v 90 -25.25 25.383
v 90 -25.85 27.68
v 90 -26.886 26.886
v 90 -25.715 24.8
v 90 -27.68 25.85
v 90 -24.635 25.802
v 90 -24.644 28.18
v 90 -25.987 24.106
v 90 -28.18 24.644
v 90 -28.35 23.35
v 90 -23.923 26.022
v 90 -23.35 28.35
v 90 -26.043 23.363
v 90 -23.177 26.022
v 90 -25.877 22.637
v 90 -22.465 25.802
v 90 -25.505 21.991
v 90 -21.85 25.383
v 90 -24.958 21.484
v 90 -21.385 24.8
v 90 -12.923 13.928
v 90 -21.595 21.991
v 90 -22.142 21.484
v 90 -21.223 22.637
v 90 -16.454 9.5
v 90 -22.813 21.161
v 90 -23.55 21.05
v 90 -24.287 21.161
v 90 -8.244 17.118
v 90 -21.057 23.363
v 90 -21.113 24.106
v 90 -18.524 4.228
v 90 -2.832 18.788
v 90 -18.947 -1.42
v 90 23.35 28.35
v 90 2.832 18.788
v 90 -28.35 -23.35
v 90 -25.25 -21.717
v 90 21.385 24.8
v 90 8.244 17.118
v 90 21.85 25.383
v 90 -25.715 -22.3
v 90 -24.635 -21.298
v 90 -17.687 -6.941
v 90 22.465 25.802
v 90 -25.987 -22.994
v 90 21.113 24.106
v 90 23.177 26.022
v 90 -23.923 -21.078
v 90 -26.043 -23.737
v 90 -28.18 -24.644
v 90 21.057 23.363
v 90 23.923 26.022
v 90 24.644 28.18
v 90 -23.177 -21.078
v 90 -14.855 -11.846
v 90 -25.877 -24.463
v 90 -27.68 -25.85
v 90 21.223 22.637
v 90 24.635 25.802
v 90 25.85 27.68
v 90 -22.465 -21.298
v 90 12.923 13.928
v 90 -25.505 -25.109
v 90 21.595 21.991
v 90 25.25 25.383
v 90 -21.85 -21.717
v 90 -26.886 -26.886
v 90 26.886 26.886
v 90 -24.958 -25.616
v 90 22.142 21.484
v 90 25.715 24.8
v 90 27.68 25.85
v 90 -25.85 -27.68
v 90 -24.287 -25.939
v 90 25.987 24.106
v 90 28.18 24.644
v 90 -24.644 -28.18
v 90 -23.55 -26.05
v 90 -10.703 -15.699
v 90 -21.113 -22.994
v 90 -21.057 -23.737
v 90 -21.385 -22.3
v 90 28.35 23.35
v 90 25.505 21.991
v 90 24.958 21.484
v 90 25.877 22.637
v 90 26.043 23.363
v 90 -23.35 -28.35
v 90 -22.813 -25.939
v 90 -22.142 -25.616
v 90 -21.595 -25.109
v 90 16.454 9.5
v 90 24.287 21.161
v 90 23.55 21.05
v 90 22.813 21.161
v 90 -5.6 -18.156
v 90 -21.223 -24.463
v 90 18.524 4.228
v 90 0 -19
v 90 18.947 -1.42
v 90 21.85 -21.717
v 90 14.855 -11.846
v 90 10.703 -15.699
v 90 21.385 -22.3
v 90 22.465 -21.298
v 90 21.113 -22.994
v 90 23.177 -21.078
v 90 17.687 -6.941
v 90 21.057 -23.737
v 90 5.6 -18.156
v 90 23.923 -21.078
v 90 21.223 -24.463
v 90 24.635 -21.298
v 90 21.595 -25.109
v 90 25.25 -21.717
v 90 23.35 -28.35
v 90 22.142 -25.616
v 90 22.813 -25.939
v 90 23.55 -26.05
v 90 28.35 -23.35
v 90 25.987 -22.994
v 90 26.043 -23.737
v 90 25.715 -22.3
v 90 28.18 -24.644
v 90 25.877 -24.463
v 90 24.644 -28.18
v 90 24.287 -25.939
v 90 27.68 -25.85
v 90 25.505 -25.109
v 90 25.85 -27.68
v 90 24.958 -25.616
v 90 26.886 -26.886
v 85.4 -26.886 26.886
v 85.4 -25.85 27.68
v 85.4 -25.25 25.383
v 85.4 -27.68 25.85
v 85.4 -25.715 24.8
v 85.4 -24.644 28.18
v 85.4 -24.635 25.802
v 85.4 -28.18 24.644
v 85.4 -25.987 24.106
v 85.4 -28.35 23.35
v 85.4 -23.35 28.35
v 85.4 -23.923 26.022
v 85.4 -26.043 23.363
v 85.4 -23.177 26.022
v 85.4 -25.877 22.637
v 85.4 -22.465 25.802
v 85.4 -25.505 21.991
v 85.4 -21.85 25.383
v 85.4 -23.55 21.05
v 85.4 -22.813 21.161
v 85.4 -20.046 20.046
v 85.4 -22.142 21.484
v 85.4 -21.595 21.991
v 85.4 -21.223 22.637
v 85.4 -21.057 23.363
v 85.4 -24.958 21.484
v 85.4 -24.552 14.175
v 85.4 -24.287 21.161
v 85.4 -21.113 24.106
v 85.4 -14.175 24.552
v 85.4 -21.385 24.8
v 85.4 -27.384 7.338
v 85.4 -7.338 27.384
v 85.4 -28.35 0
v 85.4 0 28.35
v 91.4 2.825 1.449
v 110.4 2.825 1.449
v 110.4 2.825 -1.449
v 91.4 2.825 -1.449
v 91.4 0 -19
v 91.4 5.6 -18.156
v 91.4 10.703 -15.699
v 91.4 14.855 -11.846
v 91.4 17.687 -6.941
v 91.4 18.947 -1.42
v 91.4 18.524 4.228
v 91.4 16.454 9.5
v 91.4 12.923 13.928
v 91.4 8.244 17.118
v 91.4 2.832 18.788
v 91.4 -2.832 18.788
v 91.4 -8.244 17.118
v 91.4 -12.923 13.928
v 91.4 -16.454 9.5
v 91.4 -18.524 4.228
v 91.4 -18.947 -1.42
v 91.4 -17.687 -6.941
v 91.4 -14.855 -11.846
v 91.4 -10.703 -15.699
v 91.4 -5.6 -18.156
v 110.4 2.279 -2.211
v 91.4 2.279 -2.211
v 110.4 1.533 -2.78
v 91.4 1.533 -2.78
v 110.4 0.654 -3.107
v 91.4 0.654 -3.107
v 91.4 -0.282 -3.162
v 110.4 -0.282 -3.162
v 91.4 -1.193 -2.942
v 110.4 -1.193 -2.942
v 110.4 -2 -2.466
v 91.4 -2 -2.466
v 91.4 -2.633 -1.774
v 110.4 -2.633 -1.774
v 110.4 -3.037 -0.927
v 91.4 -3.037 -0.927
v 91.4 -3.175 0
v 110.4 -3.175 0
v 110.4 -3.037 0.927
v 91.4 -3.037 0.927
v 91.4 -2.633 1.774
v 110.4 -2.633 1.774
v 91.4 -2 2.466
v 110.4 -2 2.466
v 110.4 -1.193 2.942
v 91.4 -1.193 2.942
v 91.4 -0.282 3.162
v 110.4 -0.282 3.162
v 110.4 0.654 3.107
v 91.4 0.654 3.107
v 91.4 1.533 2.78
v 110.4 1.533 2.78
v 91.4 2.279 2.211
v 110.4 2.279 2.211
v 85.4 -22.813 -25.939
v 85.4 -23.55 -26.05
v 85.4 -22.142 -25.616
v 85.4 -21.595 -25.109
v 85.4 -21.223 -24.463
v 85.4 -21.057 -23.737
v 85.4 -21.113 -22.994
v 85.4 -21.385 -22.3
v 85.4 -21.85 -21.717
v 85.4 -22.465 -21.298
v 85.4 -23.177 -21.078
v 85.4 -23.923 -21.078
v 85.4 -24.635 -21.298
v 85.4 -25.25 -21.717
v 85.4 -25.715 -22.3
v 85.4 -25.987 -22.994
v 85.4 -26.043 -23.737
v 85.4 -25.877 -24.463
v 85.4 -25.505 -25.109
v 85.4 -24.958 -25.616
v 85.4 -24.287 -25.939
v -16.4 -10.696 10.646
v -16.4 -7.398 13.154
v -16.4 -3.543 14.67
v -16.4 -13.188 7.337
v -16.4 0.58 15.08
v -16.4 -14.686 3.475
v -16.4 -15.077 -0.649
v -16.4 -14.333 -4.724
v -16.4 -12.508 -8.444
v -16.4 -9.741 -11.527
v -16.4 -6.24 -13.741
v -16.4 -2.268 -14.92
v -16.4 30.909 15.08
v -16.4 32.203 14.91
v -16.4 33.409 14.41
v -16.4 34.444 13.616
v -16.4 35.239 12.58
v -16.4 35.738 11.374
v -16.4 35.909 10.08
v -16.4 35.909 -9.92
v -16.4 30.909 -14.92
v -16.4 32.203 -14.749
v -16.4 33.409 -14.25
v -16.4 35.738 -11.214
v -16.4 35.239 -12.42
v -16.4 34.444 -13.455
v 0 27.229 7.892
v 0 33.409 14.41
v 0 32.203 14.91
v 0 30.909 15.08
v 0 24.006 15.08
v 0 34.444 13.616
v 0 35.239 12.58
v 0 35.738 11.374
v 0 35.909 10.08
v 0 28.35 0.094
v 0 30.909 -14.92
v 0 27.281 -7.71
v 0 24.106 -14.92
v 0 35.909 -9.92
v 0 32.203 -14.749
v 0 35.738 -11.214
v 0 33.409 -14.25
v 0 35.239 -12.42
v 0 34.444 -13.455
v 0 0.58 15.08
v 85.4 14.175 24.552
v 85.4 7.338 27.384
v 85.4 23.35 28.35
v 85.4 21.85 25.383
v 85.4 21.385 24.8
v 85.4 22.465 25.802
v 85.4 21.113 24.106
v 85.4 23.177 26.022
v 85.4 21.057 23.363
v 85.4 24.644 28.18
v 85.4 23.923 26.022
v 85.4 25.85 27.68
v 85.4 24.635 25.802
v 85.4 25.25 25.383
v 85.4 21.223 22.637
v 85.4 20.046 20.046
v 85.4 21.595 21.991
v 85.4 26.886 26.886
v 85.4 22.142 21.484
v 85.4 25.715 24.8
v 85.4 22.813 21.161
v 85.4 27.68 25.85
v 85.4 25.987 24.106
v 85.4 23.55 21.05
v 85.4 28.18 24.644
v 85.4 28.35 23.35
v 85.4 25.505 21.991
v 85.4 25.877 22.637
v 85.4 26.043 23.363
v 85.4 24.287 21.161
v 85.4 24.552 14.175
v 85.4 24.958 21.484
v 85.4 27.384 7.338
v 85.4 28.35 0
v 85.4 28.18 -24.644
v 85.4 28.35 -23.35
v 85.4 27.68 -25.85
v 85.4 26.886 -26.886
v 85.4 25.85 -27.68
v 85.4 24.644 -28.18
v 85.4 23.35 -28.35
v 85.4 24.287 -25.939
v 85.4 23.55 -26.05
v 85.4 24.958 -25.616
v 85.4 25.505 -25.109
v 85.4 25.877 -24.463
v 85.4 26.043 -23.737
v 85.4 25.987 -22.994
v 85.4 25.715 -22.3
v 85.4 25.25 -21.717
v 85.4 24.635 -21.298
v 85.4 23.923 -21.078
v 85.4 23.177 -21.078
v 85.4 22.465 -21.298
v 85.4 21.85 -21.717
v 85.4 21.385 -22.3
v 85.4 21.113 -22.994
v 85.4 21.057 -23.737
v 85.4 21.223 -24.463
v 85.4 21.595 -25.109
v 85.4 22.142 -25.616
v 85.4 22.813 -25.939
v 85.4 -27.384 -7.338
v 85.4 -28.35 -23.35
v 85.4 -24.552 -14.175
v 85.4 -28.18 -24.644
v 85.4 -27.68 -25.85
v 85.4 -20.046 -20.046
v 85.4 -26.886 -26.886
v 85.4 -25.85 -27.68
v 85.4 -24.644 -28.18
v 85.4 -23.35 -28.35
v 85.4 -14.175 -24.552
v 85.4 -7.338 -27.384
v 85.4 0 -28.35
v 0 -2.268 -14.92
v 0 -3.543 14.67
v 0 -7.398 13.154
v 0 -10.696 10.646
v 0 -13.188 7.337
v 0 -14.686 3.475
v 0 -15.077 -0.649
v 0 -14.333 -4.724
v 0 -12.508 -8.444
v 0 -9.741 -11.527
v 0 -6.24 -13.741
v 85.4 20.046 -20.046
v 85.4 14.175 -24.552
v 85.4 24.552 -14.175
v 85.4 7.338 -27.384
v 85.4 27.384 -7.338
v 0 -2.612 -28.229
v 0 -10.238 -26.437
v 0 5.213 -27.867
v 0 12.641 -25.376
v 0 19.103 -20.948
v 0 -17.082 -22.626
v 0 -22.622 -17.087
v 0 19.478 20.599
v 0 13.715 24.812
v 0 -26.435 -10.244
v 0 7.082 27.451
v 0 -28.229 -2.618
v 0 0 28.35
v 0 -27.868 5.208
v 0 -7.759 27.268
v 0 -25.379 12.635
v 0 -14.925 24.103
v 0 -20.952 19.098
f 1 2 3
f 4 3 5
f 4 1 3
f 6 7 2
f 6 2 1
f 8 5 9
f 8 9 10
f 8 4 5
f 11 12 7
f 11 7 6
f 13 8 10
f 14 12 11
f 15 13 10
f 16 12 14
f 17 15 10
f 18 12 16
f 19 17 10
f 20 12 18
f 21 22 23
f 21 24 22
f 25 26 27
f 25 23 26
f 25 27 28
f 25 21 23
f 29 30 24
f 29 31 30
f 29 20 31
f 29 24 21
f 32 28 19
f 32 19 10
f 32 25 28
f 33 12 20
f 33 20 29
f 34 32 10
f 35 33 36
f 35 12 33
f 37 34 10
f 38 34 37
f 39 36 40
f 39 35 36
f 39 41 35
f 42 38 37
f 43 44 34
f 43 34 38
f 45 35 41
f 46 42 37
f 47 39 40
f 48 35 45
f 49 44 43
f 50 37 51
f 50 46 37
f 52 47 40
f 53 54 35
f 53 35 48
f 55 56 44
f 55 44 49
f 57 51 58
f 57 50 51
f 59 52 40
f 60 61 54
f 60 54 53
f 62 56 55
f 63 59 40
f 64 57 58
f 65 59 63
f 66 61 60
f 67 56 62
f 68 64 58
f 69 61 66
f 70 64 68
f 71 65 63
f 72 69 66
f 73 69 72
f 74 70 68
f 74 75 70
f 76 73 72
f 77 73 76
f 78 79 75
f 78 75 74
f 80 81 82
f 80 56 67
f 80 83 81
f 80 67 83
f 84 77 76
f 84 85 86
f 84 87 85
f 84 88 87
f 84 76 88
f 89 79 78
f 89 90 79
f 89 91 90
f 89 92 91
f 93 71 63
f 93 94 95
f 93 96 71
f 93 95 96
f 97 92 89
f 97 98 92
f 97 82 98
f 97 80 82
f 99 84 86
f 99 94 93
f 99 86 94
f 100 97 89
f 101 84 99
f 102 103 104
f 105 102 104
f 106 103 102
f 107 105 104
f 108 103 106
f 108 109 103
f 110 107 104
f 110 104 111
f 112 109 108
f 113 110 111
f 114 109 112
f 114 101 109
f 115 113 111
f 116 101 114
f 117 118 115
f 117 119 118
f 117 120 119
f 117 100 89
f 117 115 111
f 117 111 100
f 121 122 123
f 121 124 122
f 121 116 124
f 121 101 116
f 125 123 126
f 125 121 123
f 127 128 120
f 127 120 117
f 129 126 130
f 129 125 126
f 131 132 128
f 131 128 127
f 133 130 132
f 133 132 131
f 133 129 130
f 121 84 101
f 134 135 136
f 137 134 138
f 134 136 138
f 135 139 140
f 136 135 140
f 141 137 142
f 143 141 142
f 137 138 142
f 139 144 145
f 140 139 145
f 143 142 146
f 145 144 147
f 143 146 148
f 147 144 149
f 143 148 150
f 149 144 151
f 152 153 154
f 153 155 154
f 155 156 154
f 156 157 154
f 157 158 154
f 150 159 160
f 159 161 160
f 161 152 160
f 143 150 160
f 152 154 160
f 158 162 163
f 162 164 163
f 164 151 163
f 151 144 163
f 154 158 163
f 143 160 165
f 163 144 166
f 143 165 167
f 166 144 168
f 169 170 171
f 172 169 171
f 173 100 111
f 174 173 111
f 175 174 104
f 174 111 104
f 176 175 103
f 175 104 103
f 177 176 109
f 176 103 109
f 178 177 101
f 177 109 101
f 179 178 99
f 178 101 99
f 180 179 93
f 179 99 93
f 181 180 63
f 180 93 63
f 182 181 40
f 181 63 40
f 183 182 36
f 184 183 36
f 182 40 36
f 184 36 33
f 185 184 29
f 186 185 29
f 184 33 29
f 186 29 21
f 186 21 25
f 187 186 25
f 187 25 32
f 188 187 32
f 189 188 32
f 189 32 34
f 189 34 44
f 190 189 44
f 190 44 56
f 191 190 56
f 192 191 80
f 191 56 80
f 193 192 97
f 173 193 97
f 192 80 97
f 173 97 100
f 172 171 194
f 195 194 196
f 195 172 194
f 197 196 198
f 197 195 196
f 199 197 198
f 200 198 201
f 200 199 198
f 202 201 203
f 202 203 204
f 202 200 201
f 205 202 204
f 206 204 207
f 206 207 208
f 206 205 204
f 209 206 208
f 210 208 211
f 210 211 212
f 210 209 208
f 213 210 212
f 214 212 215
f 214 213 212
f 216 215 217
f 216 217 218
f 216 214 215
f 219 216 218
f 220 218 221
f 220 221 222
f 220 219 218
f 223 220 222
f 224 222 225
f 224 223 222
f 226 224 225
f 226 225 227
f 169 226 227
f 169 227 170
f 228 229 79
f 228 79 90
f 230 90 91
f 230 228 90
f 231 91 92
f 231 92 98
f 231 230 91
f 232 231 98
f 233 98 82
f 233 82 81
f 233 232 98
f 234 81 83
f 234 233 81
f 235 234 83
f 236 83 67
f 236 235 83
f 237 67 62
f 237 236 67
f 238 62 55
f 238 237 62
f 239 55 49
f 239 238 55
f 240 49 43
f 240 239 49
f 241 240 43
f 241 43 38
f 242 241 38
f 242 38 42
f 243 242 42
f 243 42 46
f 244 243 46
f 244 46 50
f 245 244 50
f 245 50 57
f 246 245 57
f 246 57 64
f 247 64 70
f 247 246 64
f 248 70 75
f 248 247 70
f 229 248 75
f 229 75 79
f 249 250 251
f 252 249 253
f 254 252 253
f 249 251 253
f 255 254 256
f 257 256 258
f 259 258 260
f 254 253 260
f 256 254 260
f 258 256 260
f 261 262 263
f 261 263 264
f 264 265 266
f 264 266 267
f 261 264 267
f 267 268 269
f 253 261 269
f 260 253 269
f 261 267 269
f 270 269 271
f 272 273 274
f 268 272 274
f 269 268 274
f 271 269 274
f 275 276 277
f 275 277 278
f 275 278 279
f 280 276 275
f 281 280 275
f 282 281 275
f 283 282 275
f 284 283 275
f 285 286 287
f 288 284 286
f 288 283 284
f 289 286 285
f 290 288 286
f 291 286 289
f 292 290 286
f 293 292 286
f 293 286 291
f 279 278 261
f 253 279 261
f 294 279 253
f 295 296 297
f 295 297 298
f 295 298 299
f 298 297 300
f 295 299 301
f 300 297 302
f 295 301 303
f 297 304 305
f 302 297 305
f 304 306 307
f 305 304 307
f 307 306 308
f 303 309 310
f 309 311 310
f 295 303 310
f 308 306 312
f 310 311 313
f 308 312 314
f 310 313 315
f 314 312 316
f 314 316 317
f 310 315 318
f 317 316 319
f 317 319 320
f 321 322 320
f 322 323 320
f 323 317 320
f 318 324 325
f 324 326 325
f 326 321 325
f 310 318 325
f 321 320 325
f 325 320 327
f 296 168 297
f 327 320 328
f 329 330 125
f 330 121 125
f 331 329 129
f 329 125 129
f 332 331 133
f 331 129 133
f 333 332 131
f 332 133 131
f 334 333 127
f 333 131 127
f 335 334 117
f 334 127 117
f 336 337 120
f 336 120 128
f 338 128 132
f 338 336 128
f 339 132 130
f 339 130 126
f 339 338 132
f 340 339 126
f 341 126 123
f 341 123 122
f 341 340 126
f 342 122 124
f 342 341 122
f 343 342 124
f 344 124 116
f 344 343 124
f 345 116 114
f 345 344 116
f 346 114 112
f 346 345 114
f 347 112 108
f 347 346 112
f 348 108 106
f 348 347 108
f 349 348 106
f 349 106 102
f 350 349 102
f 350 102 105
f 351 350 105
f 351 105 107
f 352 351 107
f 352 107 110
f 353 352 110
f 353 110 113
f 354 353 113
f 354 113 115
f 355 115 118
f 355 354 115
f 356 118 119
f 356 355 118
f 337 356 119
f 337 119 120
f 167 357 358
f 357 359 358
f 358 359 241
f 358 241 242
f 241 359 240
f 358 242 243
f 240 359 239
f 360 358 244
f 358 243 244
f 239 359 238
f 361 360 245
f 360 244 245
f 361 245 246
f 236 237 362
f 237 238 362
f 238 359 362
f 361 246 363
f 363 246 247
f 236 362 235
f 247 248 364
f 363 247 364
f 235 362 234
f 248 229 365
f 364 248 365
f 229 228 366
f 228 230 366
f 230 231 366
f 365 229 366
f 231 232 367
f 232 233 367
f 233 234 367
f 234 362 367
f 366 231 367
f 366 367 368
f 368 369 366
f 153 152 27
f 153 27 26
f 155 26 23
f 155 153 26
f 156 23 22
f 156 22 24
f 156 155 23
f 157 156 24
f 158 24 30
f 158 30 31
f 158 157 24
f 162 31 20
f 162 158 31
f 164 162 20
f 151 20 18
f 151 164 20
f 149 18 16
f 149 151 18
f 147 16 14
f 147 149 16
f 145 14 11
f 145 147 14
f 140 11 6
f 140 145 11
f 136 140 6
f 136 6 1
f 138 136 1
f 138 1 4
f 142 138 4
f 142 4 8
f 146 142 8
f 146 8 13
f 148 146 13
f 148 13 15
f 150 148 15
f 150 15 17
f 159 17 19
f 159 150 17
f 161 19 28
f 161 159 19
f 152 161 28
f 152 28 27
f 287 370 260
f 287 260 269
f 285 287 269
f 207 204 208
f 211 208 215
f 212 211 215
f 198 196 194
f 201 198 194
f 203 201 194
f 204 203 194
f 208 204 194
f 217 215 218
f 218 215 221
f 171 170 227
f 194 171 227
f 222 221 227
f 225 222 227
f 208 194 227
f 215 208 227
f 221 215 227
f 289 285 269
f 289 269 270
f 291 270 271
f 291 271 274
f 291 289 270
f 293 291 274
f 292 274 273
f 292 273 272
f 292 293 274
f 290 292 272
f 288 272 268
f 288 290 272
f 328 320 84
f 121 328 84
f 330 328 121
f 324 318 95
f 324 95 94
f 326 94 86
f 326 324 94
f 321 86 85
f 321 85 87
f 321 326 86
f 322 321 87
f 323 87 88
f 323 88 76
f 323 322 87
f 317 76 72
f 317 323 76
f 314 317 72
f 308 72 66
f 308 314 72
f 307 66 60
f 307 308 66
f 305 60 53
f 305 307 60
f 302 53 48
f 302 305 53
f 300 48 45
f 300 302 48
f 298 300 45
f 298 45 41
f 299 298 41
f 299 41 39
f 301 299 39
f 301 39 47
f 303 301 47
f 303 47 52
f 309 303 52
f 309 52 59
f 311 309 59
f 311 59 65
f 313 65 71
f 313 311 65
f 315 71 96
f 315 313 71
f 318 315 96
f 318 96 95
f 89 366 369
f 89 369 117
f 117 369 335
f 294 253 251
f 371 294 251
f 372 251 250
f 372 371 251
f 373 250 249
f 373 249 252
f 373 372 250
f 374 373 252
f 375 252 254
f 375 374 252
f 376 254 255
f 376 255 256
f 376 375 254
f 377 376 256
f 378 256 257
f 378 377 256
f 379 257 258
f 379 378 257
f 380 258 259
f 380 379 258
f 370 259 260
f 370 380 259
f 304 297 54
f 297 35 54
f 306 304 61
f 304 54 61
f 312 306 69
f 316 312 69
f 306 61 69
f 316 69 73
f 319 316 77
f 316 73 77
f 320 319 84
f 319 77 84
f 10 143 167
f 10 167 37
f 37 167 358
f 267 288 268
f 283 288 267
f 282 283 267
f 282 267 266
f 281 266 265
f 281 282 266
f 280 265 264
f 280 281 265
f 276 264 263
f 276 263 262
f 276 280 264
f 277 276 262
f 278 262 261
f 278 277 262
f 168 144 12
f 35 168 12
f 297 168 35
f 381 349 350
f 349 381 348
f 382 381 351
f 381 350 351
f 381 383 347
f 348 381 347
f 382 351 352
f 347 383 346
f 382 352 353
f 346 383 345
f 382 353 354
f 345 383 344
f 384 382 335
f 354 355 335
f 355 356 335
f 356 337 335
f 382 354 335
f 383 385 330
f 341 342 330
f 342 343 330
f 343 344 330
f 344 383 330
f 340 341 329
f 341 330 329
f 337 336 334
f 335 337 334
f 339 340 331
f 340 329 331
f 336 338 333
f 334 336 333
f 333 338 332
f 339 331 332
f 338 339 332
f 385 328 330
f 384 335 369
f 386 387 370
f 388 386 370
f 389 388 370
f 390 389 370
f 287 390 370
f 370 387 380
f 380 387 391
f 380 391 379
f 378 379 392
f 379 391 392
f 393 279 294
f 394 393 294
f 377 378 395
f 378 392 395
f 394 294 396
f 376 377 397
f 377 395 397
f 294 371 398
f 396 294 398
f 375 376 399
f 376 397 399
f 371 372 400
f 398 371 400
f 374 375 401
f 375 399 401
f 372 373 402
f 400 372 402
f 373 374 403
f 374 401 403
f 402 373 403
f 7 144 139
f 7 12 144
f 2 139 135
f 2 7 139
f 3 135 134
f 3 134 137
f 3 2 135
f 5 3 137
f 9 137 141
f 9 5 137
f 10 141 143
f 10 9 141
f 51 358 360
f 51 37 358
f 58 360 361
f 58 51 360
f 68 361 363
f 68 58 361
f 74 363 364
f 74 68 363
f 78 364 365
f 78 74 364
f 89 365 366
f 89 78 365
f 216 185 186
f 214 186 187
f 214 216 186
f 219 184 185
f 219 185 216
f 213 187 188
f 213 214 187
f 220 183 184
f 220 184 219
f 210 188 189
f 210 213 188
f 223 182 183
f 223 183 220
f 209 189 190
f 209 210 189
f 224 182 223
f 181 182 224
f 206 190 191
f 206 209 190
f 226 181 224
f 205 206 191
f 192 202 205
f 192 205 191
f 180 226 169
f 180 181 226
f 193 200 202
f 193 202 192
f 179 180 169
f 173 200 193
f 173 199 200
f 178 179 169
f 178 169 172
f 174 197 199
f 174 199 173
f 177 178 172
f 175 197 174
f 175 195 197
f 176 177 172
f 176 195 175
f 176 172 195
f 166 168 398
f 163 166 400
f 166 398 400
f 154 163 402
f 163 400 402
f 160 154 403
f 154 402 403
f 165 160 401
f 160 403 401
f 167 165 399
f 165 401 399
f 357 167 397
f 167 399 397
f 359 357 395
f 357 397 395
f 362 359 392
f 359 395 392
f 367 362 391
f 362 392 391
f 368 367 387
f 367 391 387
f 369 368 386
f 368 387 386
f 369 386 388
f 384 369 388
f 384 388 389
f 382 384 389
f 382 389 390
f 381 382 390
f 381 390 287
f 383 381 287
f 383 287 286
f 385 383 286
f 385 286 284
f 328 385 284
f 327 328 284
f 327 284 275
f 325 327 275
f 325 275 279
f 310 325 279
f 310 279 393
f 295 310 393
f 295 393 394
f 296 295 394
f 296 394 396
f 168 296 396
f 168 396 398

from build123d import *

# Parameters (mm, degrees)
SKETCH1_R           = 28.35
BOSS_EXTRUDE1_DEPTH = 85.4
SKETCH2_W           = 56.7
SKETCH2_H           = 56.7
SKETCH2_R           = 2.5
BOSS_EXTRUDE2_DEPTH = 4.6
SKETCH3_R           = 19
BOSS_EXTRUDE3_DEPTH = 1.4
BOSS_EXTRUDE4_DEPTH = 19
FILLET1_R           = 5
BOSS_EXTRUDE5_DEPTH = 16.4


with BuildPart() as part:
    # Sketch1 → Boss-Extrude1 (new body)
    with BuildSketch(Plane(origin=(0, 0, 0), x_dir=(0, 0, -1), z_dir=(1, 0, 0))):
        with Locations(Location((0, 0, 0), (0, 0, 180))):
            Circle(SKETCH1_R)
    extrude(amount=BOSS_EXTRUDE1_DEPTH)

    # Sketch2 → Boss-Extrude2 (add)
    with BuildSketch(Plane(origin=(85.4, 0, 0), x_dir=(0, 0, -1), z_dir=(1, 0, 0))):
        Rectangle(SKETCH2_W, SKETCH2_H)
        with Locations((-23.55, 23.55)):
            Circle(SKETCH2_R, mode=Mode.SUBTRACT)
        with Locations((23.55, 23.55)):
            Circle(SKETCH2_R, mode=Mode.SUBTRACT)
        with Locations((23.55, -23.55)):
            Circle(SKETCH2_R, mode=Mode.SUBTRACT)
        with Locations((-23.55, -23.55)):
            Circle(SKETCH2_R, mode=Mode.SUBTRACT)
    extrude(amount=BOSS_EXTRUDE2_DEPTH)

    # Sketch3 → Boss-Extrude3 (add)
    with BuildSketch(Plane(origin=(90, 0, 0), x_dir=(0, 0, -1), z_dir=(1, 0, 0))):
        Circle(SKETCH3_R)
    extrude(amount=BOSS_EXTRUDE3_DEPTH)

    # Sketch4 → Boss-Extrude4 (add)
    with BuildSketch(Plane(origin=(91.4, 0, 0), x_dir=(0, 0, -1), z_dir=(1, 0, 0))):
        with BuildLine():
            Line((-1.449137675, 2.825), (1.449137675, 2.825))
            ThreePointArc((1.449137675, 2.825), (0, -3.175), (-1.449137675, 2.825))
        make_face()
    extrude(amount=BOSS_EXTRUDE4_DEPTH)

    # Fillet1
    fillet1_edges = [part.edges().sort_by_distance(p)[0] for p in [
        (87.7, -28.35, 28.35),
        (87.7, -28.35, -28.35),
        (87.7, 28.35, -28.35),
        (87.7, 28.35, 28.35),
    ]]
    fillet(fillet1_edges, radius=FILLET1_R)

    # Sketch5 → Boss-Extrude5 (add)
    with BuildSketch(Plane.ZY):
        with BuildLine():
            Line((-14.919834855, -2.268447858), (-14.919834855, 30.908700262))
            ThreePointArc((-14.919834855, 30.908700262), (-13.455368761, 34.444234167), (-9.919834855, 35.908700262))
            Line((-9.919834855, 35.908700262), (10.080165145, 35.908700262))
            ThreePointArc((10.080165145, 35.908700262), (13.615699051, 34.444234167), (15.080165145, 30.908700262))
            Line((15.080165145, 30.908700262), (15.080165145, 0.579609357))
            ThreePointArc((15.080165145, 0.579609357), (1.426283256, -15.023749328), (-14.919834855, -2.268447858))
        make_face()
    extrude(amount=BOSS_EXTRUDE5_DEPTH)


solid = part.part
